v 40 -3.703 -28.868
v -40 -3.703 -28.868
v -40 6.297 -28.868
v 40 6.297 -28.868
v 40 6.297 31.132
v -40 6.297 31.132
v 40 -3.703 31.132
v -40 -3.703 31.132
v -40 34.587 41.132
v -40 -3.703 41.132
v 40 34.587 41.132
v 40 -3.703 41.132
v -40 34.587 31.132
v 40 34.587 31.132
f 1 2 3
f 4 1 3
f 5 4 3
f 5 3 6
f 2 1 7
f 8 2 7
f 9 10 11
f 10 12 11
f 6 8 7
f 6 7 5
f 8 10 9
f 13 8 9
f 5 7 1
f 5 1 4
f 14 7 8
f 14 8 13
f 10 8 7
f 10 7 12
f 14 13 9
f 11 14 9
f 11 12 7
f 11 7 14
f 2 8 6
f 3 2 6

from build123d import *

# Parameters (mm, degrees)
F0_W          = 10
F0_H          = 60
F1_DEPTH      = 40
F1_DEPTH_BACK = 40
F2_W          = 38.290422
F2_H          = 10
F3_DEPTH      = 40
F3_DEPTH_BACK = 40


with BuildPart() as f1:
    # F0 (on Right) → F1 (new body, two sides)
    with BuildSketch(Plane.YZ) as f1_sk:
        with Locations((1.296799, 1.131736)):
            Rectangle(F0_W, F0_H)
    extrude(amount=F1_DEPTH)
    extrude(f1_sk.sketch, amount=-F1_DEPTH_BACK)


with BuildPart() as f3:
    # F2 (on Right) → F3 (new body, two sides)
    with BuildSketch(Plane.YZ) as f3_sk:
        with Locations((15.44201, 36.131736)):
            Rectangle(F2_W, F2_H)
    extrude(amount=F3_DEPTH)
    extrude(f3_sk.sketch, amount=-F3_DEPTH_BACK)


solid = Compound([f1.part, f3.part])
